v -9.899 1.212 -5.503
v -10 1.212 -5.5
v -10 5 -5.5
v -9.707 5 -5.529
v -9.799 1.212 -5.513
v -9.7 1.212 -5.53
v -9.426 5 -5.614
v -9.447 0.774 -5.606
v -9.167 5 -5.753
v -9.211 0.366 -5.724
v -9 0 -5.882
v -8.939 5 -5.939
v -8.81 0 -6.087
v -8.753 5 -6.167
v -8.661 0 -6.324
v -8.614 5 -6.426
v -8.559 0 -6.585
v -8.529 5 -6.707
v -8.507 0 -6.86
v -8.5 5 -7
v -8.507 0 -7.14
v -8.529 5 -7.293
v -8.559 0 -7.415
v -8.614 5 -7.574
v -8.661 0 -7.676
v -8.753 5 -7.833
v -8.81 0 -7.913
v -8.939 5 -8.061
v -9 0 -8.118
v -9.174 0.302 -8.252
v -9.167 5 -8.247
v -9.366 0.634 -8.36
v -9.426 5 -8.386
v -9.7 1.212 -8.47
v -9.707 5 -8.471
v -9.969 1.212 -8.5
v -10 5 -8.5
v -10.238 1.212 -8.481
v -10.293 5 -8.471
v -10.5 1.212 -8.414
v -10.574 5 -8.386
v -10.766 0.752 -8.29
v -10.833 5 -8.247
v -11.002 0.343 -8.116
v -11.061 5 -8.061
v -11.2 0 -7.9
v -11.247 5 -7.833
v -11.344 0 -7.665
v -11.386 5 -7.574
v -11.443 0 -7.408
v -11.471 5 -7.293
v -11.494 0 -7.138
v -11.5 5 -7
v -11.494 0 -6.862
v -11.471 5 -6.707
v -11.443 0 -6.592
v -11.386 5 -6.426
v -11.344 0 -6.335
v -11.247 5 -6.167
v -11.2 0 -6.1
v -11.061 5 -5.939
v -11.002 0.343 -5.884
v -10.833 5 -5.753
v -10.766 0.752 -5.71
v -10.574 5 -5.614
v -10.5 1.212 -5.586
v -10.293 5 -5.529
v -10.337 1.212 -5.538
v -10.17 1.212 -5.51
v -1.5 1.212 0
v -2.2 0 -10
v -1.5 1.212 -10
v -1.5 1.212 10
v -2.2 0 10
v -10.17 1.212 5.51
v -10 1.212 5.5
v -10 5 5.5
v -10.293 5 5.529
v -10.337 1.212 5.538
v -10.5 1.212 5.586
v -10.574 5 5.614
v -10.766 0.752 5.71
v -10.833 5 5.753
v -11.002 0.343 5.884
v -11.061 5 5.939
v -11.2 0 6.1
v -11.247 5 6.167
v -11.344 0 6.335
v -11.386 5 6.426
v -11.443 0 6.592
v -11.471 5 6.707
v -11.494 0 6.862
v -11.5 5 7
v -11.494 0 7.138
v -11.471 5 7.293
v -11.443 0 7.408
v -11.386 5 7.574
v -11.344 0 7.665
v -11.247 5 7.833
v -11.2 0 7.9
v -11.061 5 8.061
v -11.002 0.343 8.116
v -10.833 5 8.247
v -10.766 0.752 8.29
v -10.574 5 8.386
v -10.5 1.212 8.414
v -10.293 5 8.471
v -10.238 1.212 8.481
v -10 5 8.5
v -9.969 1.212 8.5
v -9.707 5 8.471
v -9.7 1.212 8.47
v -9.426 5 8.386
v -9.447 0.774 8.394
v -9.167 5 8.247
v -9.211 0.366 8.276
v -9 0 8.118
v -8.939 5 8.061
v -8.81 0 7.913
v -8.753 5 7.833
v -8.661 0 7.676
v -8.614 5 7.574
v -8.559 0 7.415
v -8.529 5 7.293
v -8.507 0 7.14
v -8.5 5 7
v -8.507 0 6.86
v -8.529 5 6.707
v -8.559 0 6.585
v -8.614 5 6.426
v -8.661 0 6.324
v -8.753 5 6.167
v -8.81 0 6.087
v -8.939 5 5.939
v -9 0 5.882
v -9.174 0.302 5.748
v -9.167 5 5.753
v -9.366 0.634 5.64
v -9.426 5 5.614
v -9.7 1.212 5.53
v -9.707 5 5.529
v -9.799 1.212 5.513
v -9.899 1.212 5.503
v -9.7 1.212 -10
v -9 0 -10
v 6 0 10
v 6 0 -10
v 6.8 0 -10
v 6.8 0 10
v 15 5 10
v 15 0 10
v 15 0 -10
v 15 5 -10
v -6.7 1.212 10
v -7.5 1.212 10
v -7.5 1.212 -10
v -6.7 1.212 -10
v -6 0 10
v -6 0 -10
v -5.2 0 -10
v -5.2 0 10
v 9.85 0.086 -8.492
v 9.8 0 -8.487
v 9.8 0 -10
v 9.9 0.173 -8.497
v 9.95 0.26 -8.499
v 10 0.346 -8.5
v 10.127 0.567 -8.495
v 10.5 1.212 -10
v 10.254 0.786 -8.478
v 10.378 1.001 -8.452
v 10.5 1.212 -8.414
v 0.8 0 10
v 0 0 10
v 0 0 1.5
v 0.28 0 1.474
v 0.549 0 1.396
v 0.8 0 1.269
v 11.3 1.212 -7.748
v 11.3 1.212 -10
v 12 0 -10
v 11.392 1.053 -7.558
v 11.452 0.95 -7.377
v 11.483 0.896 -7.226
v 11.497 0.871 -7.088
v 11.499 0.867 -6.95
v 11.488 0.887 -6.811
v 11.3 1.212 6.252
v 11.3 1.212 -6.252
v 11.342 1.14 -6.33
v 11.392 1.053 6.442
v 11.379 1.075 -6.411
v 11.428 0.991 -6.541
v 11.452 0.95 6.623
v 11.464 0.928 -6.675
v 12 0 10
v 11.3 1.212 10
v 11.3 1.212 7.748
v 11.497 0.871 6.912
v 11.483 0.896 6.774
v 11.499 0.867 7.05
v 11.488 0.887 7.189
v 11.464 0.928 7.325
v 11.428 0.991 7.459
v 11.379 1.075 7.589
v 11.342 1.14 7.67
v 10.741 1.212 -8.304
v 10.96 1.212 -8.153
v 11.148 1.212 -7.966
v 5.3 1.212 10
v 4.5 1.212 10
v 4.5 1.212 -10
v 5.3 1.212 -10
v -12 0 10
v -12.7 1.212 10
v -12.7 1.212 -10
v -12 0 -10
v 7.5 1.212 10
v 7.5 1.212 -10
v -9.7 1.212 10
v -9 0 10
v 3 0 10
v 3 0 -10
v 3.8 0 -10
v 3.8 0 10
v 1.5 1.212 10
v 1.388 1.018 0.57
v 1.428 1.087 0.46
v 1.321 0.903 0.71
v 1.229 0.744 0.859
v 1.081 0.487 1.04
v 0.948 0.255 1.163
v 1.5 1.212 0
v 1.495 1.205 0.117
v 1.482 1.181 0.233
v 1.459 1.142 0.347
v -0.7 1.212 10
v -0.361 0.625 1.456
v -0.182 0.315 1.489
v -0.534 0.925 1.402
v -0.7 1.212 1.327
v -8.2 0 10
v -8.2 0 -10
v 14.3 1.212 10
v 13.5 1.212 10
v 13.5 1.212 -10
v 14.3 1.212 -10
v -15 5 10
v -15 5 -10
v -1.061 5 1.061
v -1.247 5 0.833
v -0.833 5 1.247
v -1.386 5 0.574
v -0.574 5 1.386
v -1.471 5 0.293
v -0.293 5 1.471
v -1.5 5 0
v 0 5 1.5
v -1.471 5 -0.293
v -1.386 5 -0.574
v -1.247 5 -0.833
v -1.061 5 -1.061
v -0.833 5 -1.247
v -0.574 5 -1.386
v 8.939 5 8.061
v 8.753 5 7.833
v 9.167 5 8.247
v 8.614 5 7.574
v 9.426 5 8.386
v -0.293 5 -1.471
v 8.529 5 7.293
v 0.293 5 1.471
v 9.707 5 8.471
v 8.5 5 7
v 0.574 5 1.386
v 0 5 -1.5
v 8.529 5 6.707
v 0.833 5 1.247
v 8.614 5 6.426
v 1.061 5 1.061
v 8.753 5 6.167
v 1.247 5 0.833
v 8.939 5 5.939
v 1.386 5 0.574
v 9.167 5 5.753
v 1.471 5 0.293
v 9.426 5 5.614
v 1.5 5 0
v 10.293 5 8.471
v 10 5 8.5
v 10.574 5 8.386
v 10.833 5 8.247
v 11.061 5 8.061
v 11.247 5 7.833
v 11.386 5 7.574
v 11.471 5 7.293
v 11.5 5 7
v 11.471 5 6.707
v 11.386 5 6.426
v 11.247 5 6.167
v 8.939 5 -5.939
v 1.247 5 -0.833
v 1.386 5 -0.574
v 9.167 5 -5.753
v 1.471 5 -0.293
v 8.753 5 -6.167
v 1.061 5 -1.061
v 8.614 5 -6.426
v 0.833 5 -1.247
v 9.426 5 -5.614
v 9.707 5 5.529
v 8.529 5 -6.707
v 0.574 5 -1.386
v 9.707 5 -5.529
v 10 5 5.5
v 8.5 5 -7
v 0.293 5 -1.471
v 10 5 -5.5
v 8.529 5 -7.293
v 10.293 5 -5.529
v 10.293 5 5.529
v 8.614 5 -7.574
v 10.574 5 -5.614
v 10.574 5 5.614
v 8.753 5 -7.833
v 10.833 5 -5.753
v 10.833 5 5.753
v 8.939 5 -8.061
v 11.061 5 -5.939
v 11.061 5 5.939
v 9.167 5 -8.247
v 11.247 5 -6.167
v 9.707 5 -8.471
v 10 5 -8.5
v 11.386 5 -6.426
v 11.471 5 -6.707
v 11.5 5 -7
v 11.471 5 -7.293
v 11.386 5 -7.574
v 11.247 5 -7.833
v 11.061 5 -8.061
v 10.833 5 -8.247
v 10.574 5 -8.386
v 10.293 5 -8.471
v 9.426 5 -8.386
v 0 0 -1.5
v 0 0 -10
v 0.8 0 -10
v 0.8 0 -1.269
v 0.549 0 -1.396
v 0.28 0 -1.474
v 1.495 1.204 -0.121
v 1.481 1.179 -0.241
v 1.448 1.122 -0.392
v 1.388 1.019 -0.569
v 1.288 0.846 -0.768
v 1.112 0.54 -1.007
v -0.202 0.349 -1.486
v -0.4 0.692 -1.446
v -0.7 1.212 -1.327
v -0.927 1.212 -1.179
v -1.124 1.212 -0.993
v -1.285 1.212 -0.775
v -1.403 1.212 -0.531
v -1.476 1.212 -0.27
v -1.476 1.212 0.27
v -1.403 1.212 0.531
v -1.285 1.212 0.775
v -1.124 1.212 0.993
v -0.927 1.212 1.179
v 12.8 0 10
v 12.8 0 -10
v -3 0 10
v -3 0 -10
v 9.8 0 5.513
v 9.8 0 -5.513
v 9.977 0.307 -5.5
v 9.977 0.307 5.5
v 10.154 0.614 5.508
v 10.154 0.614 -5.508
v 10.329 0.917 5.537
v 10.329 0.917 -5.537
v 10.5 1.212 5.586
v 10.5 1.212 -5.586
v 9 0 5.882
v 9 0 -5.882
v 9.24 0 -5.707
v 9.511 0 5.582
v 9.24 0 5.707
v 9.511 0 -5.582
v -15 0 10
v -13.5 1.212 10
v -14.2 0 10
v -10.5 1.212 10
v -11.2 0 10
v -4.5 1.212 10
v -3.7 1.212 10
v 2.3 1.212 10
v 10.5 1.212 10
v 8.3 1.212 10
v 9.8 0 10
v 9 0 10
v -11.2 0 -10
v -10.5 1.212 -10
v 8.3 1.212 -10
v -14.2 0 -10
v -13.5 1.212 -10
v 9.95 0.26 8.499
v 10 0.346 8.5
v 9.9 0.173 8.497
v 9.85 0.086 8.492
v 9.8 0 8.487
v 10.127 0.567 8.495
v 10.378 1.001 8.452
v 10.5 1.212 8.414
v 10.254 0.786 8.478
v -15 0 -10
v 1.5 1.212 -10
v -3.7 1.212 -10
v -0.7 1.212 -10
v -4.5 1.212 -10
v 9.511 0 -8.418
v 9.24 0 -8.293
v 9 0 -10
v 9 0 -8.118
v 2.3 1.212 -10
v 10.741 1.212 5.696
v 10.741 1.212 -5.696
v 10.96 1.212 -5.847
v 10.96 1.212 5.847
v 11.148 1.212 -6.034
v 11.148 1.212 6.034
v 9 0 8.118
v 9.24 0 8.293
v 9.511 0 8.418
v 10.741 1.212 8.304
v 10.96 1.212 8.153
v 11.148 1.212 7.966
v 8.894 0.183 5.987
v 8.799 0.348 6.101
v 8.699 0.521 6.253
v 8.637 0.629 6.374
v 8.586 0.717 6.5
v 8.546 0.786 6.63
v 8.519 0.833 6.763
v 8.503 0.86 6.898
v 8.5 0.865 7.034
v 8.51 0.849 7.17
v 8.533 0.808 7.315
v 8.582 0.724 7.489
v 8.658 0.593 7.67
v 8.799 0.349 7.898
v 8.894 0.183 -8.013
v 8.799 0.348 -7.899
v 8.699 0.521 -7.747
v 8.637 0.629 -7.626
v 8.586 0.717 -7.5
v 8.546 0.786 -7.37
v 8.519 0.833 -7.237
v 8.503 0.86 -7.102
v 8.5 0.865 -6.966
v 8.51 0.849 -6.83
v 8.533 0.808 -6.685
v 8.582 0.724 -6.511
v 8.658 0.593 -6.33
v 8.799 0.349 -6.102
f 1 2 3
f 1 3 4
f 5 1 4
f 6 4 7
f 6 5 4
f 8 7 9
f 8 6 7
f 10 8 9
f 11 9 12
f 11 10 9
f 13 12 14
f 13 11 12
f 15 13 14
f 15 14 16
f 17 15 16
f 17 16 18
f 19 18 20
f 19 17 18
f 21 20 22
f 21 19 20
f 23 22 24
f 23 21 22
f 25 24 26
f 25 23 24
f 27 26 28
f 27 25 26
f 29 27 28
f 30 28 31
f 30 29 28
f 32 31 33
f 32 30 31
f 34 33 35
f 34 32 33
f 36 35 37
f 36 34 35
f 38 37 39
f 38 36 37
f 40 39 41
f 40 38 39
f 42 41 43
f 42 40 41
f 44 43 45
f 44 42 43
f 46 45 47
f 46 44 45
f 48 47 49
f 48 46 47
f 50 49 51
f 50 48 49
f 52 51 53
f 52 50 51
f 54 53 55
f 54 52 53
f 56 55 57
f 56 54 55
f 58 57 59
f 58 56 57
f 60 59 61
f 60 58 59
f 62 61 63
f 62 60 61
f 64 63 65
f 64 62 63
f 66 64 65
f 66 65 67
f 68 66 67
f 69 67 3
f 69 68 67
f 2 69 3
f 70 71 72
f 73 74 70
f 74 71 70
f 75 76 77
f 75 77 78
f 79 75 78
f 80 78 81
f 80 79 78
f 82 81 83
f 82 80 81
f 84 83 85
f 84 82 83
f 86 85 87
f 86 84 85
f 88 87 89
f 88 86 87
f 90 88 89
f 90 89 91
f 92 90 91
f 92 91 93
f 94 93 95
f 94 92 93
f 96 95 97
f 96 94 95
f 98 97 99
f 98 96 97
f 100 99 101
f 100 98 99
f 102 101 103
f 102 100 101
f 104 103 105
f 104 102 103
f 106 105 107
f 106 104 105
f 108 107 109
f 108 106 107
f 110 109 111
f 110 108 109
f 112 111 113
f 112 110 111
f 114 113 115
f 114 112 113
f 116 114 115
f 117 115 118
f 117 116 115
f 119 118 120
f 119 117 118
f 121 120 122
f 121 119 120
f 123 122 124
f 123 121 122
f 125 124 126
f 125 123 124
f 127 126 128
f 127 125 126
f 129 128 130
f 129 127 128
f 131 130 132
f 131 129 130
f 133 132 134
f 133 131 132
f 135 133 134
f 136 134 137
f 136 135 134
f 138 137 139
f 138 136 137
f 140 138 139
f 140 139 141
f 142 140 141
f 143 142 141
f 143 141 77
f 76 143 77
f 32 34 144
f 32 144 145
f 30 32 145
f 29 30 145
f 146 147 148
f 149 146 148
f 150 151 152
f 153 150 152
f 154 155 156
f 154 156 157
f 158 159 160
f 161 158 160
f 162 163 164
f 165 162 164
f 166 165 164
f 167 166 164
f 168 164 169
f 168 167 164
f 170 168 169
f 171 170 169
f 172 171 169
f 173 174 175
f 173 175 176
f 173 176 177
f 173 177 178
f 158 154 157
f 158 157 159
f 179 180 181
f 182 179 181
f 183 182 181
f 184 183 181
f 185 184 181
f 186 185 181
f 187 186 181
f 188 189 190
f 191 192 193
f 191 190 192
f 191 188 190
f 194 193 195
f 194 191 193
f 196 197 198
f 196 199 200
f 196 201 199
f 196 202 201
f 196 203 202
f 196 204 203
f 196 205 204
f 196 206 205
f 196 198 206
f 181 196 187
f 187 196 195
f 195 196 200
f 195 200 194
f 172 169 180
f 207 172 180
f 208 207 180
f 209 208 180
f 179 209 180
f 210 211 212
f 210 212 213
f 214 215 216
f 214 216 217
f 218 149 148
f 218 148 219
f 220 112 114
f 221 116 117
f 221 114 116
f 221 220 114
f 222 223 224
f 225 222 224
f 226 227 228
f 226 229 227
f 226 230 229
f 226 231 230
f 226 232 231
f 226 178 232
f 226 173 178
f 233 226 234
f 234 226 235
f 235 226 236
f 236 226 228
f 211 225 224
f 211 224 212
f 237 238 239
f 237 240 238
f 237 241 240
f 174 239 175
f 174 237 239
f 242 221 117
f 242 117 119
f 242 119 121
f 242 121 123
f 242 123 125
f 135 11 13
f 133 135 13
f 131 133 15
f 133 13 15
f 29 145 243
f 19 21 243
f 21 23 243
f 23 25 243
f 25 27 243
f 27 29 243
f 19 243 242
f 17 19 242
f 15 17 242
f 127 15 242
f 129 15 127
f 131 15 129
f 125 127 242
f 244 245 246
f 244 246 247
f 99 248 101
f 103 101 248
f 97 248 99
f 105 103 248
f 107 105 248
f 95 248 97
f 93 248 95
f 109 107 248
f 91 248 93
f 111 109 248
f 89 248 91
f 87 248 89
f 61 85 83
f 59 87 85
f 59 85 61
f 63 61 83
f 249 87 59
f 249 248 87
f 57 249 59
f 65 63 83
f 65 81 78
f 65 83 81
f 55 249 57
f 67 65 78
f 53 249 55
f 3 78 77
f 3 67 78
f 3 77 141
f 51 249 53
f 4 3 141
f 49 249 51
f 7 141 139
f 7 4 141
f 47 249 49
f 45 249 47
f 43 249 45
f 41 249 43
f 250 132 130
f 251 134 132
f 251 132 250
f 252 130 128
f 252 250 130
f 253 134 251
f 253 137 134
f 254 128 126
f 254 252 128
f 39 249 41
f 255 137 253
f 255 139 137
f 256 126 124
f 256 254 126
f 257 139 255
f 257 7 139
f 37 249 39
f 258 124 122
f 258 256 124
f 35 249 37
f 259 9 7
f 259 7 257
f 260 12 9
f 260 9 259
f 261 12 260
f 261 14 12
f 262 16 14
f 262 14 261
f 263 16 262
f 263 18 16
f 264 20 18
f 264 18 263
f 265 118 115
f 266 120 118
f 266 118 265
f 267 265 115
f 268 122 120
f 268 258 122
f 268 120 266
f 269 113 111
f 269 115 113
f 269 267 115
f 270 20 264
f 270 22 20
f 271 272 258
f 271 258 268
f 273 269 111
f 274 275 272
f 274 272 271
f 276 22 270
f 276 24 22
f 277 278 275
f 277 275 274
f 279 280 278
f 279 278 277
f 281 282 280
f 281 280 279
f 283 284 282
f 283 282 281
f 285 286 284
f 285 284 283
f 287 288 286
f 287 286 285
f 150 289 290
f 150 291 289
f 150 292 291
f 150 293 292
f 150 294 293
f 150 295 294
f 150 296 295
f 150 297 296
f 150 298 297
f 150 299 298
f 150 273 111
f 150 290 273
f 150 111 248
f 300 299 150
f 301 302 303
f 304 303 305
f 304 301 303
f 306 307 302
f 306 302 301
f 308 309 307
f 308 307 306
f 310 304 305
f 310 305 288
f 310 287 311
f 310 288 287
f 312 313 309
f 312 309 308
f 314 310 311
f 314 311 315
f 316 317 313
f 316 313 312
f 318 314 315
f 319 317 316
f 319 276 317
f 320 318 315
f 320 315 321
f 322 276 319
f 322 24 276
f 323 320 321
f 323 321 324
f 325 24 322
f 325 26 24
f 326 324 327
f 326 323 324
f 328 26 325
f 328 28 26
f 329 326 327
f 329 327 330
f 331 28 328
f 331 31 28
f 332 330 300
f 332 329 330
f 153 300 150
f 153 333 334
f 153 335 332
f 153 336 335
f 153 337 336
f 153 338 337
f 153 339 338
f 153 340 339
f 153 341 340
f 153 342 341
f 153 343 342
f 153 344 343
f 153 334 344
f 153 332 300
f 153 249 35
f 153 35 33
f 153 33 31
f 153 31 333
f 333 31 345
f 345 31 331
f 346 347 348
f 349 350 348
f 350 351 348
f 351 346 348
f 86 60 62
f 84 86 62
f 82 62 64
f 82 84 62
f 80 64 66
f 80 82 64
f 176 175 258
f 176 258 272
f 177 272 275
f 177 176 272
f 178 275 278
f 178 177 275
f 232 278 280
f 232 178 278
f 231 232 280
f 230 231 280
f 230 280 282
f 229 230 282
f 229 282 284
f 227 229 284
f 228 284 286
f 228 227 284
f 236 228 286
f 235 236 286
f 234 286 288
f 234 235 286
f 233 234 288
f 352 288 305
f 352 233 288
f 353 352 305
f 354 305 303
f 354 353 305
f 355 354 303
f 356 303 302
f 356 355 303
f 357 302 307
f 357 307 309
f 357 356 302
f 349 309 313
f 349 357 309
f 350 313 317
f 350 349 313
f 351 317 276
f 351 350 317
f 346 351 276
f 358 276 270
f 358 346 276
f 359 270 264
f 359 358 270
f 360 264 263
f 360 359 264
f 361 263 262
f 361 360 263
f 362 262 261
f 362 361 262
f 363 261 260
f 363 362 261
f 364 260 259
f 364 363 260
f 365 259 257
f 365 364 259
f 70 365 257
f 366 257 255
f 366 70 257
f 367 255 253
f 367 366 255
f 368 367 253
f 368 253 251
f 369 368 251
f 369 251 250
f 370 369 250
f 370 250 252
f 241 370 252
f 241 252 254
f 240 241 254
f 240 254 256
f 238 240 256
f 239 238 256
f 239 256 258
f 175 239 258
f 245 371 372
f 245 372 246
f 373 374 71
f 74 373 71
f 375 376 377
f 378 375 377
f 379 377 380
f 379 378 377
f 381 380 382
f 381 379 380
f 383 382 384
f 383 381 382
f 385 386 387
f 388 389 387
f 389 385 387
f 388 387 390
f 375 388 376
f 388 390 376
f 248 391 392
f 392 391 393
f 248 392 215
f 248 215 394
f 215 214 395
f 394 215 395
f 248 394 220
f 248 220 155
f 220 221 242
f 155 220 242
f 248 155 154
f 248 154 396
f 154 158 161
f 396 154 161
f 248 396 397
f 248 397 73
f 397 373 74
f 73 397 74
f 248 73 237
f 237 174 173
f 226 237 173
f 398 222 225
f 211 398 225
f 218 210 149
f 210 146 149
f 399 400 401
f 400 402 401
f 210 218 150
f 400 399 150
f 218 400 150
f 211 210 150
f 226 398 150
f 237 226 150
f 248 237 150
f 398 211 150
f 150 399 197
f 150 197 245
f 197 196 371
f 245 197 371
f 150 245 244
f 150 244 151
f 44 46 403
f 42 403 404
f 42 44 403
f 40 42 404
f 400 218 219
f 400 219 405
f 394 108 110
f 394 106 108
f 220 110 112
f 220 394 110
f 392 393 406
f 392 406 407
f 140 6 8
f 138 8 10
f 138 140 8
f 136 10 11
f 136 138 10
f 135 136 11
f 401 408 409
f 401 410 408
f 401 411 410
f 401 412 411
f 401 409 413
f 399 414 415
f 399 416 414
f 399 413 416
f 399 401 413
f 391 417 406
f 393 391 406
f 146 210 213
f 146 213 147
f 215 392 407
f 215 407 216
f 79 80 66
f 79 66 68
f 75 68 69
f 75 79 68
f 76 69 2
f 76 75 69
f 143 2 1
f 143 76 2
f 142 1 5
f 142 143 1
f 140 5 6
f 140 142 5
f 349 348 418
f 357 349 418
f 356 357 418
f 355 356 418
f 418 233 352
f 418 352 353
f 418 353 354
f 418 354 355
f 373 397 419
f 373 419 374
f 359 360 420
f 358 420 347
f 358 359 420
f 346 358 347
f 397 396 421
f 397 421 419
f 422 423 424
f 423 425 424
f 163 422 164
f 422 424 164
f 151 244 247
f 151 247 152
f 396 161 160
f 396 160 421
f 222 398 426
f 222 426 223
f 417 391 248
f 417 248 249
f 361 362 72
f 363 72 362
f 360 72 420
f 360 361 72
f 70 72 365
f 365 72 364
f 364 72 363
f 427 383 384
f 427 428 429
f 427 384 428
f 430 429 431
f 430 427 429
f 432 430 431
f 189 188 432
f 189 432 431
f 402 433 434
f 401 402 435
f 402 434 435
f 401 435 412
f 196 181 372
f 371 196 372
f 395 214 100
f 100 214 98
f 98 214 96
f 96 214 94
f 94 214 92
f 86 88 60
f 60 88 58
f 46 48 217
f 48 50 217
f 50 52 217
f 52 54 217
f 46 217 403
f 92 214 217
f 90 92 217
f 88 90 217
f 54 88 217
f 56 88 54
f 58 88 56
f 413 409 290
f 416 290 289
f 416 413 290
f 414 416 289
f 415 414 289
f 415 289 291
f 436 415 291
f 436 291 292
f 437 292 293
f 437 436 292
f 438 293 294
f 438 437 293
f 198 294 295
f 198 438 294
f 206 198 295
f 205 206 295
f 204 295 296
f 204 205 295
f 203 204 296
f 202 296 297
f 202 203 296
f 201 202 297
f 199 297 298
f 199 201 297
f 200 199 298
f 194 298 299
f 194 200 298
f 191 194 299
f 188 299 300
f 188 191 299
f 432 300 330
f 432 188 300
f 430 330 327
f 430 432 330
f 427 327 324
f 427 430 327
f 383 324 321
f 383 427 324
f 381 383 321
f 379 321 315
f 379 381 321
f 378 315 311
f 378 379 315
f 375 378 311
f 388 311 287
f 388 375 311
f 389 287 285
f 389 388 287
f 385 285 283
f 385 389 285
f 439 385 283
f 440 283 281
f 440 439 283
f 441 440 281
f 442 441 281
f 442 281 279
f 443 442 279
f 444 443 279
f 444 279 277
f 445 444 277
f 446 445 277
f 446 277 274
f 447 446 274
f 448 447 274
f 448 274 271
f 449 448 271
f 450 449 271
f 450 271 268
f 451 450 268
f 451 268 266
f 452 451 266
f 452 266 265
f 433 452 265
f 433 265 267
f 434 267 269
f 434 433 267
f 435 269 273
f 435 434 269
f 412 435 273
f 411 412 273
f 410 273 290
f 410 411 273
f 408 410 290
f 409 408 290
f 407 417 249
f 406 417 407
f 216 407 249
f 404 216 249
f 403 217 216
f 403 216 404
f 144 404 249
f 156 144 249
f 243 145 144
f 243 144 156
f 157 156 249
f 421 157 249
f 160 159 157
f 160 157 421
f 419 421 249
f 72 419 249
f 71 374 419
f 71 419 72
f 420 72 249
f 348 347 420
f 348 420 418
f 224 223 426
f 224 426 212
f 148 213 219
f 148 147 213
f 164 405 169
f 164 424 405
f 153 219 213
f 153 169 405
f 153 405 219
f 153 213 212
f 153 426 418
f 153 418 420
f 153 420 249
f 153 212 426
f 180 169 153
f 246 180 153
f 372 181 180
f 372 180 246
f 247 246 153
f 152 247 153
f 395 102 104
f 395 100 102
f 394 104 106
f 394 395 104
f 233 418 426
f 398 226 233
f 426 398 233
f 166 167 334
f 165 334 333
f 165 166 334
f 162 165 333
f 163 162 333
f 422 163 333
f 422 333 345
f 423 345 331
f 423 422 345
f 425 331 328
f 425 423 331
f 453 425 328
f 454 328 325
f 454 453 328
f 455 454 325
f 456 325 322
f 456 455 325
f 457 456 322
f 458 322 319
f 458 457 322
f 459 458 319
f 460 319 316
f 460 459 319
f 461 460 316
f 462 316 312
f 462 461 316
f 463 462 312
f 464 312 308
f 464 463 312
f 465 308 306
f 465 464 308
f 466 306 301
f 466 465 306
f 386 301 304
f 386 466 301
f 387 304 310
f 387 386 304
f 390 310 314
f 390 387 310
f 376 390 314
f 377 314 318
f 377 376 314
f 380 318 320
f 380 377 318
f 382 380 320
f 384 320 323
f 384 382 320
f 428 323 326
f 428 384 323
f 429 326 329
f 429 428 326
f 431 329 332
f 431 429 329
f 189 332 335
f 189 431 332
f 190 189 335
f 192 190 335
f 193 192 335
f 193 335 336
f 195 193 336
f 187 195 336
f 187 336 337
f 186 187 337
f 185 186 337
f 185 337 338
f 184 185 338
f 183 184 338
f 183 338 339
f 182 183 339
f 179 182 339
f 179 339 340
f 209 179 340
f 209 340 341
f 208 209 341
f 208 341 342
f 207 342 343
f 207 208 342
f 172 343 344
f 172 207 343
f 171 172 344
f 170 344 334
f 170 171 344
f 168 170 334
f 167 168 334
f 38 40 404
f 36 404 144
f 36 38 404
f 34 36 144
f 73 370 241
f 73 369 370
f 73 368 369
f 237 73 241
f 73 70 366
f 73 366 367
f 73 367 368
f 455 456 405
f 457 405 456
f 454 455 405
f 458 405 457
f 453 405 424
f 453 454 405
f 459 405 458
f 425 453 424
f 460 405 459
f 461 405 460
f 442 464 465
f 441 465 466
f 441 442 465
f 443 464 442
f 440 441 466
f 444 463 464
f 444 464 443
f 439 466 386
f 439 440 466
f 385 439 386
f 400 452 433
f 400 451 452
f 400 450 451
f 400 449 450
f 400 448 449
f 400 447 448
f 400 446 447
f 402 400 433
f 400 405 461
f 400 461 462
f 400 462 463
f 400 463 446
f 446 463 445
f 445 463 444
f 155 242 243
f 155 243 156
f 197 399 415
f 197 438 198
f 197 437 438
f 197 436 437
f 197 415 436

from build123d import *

# Parameters (mm, degrees)
SKETCH_1_W             = 30
SKETCH_1_H             = 20
SKETCH_1_R             = 1.5
EXTRUDE_1_DEPTH        = 5
CUT_EXTRUDE_1_DEPTH    = 19.708286934
PATTERN_LINEAR_1_COUNT = 10
PATTERN_LINEAR_1_PITCH = 3


with BuildPart() as part:
    # 草图1 → 凸台-拉伸1 (new body)
    with BuildSketch(Plane(origin=(0, 0, 0), x_dir=(1, 0, 0), z_dir=(0, 1, 0))):
        Rectangle(SKETCH_1_W, SKETCH_1_H)
        with Locations(Location((-10, 7, 0), (0, 0, 270))):
            Circle(SKETCH_1_R, mode=Mode.SUBTRACT)
        with Locations(Location((10, 7, 0), (0, 0, 90))):
            Circle(SKETCH_1_R, mode=Mode.SUBTRACT)
        with Locations(Location((10, -7, 0), (0, 0, 270))):
            Circle(SKETCH_1_R, mode=Mode.SUBTRACT)
        with Locations(Location((-10, -7, 0), (0, 0, 90))):
            Circle(SKETCH_1_R, mode=Mode.SUBTRACT)
        with Locations(Location((0, 0, 0), (0, 0, 270))):
            Circle(SKETCH_1_R, mode=Mode.SUBTRACT)
    extrude(amount=EXTRUDE_1_DEPTH)

    # 草图2 → 切除-拉伸1 (cut, symmetric)
    with BuildSketch(Plane.XY):
        Polygon((-85.827625303, 0), (-15, 0), (-14.2, 0), (-13.5, 1.212435565), (-12.7, 1.212435565), (-12, 0), (23.413812651, -61.338522802), (-45.939949713, -184.854779506), (-155.181387668, -123.516256704), align=None)
    cut_extrude_1 = extrude(amount=CUT_EXTRUDE_1_DEPTH, both=True, mode=Mode.SUBTRACT)

    # 阵列(线性)1: 切除-拉伸1 ×10
    with Locations(*[(i * PATTERN_LINEAR_1_PITCH, 0, 0) for i in range(1, PATTERN_LINEAR_1_COUNT)]):
        add(cut_extrude_1, mode=Mode.SUBTRACT)


solid = part.part
